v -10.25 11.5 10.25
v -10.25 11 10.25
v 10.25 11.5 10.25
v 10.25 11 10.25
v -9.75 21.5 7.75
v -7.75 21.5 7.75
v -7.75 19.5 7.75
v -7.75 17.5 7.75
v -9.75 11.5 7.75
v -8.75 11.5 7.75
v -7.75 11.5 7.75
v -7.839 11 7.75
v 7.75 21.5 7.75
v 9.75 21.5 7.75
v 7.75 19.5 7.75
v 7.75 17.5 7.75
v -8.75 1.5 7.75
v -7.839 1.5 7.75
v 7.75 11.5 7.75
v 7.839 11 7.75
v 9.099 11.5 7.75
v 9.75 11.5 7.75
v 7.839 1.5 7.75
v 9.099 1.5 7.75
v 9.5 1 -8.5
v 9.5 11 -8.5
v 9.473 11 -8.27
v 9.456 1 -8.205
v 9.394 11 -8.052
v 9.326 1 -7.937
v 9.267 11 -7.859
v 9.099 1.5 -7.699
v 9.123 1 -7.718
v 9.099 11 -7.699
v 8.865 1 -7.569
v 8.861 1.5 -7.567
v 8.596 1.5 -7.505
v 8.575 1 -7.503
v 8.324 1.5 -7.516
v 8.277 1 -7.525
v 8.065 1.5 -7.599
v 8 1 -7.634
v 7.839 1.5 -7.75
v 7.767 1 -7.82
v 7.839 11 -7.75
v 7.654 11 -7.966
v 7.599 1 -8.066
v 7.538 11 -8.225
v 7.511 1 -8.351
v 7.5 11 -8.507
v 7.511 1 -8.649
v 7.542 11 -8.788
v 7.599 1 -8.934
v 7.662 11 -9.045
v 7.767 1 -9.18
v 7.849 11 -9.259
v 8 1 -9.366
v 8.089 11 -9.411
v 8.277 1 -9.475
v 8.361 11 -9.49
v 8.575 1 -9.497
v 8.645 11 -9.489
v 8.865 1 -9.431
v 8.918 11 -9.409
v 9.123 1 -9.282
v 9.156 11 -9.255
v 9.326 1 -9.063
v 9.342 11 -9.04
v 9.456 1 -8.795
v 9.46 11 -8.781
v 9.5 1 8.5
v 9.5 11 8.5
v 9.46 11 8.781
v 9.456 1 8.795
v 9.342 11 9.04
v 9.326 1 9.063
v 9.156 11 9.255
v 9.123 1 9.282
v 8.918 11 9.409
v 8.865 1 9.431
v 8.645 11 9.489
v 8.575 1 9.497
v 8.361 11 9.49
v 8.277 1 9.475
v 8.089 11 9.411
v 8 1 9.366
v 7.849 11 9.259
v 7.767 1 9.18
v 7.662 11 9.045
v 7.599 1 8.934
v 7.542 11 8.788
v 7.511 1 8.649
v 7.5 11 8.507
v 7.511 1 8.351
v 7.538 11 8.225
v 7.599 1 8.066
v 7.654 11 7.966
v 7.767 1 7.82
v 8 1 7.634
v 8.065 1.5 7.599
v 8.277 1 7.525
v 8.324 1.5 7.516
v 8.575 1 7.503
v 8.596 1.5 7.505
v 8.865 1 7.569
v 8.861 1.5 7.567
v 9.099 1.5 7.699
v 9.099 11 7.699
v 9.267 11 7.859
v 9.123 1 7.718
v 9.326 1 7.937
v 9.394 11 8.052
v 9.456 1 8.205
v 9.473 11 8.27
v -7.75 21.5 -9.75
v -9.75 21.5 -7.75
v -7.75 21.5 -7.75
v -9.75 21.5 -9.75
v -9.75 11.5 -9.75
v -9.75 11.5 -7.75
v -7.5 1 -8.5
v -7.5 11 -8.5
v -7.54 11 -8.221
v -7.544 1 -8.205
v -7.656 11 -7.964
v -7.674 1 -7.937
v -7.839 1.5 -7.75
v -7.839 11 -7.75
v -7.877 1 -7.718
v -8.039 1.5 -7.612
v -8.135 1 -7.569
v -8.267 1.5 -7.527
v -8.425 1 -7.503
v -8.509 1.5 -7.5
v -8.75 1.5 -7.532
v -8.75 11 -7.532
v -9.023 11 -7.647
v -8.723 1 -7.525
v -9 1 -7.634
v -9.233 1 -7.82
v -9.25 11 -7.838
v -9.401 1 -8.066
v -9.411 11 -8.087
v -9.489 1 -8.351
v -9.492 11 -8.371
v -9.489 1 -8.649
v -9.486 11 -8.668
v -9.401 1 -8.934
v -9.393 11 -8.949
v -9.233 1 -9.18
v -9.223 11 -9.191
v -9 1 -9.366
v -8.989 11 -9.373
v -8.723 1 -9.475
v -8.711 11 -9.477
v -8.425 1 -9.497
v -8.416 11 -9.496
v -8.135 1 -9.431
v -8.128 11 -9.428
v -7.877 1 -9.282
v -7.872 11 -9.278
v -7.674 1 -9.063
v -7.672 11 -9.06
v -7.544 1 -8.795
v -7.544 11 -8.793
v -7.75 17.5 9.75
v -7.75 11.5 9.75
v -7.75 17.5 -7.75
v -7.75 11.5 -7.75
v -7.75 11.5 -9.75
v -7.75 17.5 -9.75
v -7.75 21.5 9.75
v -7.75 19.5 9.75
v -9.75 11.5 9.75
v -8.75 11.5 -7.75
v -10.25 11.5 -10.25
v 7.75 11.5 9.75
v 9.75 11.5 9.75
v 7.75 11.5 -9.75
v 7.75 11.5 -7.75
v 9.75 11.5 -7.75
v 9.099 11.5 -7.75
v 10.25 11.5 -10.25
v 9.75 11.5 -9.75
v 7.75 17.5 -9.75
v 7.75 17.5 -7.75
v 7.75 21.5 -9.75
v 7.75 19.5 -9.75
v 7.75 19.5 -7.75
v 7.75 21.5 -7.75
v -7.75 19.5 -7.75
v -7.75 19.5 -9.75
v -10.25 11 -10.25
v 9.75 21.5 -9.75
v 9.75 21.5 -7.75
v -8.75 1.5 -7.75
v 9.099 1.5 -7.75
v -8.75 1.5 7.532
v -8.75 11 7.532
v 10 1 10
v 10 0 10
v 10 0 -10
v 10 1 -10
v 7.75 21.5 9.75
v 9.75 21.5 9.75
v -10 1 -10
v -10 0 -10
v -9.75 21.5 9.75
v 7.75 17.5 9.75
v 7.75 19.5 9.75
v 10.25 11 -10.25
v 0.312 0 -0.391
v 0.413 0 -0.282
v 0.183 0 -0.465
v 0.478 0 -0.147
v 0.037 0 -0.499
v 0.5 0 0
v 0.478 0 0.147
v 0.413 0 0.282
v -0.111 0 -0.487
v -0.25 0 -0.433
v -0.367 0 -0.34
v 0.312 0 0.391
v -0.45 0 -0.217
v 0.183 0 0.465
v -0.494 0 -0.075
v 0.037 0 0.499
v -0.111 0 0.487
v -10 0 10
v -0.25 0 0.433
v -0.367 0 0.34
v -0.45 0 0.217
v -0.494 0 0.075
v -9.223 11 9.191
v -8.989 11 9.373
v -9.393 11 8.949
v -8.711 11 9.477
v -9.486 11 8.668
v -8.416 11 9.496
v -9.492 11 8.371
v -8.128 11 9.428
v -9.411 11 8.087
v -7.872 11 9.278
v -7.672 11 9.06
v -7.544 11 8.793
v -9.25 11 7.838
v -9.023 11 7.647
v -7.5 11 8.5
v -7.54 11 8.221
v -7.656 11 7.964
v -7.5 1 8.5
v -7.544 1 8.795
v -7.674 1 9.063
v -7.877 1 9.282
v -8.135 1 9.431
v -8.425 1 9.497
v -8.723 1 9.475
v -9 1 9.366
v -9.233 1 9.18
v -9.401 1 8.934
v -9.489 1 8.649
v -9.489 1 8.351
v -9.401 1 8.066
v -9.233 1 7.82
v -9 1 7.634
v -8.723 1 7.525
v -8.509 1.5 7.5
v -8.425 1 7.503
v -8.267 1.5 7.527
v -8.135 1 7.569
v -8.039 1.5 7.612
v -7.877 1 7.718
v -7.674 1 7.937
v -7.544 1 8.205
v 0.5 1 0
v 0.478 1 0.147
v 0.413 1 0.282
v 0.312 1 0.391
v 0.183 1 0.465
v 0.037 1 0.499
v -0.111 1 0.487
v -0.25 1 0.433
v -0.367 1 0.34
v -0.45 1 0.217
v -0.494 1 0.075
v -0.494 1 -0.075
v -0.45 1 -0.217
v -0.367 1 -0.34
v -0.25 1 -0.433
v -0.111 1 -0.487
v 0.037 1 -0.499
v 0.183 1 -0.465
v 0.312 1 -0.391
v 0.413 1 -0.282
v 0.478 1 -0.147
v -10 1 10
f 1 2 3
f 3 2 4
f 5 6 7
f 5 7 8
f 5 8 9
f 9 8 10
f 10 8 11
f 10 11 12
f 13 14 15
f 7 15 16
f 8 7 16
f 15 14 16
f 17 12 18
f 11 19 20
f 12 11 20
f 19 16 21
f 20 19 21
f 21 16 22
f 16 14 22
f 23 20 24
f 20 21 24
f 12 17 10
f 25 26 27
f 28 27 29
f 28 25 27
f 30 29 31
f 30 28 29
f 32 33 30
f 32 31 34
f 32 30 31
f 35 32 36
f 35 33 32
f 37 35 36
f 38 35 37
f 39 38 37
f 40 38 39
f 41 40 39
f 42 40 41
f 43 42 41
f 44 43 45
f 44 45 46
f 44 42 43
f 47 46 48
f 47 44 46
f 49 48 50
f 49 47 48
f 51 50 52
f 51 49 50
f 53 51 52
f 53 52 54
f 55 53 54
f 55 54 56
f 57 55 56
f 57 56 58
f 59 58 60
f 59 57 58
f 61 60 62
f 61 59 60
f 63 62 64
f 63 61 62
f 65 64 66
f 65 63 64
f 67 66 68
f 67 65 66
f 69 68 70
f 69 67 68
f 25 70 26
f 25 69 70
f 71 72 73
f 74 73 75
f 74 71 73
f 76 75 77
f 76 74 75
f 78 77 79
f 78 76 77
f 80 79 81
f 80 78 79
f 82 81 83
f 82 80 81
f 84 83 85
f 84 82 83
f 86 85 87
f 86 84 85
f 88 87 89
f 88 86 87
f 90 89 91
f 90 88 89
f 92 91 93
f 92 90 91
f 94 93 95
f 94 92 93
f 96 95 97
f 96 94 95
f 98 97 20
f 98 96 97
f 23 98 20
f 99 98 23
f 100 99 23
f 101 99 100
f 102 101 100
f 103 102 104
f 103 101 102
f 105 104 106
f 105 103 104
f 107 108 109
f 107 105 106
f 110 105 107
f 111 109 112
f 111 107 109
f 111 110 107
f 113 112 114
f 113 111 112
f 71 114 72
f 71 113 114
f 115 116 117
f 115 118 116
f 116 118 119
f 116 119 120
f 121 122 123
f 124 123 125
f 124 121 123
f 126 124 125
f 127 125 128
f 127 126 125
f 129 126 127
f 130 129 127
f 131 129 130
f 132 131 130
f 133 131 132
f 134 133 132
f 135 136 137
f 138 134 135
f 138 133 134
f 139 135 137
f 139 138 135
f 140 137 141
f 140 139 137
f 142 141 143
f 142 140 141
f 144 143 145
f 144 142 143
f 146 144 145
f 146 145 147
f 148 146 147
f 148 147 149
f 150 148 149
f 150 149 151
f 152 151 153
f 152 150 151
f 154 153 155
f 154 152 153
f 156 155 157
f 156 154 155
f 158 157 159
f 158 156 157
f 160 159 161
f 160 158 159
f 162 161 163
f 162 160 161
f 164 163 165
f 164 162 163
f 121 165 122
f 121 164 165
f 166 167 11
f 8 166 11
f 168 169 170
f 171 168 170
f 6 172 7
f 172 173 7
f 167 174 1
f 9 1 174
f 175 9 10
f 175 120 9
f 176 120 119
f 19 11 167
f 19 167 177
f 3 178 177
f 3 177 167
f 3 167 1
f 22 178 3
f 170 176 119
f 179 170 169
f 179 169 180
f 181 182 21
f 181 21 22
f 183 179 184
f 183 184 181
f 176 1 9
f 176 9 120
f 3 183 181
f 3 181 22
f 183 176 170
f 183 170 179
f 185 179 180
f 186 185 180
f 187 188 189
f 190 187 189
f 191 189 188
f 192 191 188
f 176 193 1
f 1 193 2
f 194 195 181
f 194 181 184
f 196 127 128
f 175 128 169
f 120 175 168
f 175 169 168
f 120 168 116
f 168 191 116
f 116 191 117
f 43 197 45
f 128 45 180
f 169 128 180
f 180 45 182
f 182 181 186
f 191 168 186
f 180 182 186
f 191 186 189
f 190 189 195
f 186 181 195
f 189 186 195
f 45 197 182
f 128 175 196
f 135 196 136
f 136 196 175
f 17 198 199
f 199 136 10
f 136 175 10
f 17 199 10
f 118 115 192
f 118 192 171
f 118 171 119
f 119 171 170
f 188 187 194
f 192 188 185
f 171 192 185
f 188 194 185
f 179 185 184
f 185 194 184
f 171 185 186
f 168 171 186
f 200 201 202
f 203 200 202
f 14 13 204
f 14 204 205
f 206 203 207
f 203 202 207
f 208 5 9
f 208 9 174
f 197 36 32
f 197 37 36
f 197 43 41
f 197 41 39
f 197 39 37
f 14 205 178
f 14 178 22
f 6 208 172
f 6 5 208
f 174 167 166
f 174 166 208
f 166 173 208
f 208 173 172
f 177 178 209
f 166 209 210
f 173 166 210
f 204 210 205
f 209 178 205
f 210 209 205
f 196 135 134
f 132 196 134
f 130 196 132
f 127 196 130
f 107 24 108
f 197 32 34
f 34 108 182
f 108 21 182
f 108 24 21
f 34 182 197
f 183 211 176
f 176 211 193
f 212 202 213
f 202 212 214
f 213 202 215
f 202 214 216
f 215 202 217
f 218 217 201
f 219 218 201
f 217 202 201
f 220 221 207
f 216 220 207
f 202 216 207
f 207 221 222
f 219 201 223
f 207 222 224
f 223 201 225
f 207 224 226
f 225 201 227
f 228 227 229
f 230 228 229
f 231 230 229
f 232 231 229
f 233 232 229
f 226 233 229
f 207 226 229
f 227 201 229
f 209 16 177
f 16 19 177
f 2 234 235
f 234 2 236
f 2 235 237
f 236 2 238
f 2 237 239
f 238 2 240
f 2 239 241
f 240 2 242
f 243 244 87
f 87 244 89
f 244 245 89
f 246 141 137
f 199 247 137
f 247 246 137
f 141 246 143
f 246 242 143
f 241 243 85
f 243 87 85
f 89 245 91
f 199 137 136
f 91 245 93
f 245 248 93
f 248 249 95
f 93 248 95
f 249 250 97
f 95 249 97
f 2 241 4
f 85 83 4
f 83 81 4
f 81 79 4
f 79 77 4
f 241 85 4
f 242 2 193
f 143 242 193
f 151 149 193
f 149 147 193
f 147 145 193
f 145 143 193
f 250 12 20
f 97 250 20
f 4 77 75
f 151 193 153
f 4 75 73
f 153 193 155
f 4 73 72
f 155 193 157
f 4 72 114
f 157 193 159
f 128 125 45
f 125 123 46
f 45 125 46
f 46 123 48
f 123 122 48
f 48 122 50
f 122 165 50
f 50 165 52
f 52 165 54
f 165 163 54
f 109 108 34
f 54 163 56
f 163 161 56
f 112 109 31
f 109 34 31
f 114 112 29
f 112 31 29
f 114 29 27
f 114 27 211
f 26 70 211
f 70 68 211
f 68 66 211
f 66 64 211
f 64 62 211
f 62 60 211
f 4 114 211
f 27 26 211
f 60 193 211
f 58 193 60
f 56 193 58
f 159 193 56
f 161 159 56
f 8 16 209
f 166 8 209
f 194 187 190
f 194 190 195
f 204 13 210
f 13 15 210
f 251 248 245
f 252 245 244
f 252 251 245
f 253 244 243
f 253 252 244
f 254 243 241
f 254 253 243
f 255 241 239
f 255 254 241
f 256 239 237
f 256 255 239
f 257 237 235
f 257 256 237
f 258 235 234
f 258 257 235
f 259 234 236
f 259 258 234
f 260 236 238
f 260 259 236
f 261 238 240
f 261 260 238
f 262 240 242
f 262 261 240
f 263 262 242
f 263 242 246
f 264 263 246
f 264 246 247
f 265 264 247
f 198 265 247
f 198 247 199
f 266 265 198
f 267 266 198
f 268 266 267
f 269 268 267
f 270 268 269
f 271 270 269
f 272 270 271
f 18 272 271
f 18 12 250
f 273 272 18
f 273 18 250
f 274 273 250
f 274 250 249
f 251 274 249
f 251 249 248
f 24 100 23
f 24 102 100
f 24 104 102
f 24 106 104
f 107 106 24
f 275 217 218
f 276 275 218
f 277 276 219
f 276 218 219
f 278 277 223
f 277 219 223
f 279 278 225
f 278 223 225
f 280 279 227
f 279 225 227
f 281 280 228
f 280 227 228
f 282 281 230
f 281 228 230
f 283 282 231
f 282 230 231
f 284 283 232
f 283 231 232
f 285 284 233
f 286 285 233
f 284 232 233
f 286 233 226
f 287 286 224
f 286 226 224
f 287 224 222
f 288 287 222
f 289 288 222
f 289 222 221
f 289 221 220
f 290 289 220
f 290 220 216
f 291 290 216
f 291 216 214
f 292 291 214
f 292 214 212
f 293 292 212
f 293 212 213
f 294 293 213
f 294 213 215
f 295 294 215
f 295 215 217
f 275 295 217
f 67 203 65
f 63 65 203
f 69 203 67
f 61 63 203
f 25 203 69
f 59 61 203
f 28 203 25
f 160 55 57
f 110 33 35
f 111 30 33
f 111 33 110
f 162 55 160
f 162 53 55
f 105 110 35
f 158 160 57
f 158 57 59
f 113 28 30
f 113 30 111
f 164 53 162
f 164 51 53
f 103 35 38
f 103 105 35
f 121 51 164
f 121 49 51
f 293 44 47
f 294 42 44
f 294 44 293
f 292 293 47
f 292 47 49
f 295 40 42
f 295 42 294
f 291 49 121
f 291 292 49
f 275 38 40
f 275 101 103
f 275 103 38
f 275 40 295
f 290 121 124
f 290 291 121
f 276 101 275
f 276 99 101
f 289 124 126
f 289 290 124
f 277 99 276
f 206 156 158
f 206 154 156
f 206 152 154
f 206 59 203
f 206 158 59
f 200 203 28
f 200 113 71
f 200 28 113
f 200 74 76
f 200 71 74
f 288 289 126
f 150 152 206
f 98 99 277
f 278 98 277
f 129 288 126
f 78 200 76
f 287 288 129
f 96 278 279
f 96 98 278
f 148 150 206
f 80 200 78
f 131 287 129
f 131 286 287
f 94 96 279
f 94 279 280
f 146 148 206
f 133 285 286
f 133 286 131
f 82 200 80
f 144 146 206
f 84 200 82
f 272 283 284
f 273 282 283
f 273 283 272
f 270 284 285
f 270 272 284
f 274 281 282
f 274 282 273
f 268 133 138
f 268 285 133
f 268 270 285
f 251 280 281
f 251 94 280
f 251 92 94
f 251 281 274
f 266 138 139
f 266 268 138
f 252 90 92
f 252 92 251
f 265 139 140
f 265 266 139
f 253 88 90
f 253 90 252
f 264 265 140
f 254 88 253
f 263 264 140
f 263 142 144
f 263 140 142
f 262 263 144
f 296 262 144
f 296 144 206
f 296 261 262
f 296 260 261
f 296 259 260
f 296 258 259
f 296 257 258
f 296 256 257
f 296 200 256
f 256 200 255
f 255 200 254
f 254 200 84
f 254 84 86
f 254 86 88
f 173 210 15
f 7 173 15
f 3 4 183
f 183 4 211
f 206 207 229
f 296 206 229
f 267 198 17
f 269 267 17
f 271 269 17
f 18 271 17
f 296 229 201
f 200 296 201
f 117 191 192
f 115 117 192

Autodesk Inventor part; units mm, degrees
ref_plane "YZ Plane" through (0, 0, 0) normal (1, 0, 0) x (0, 1, 0)
ref_plane "XZ Plane" through (0, 0, 0) normal (0, 1, 0) x (-1, 0, 0)
ref_plane "XY Plane" through (0, 0, 0) normal (0, 0, 1) x (1, 0, 0)
sketch "Sketch6" plane through (0, 0, 0) normal (0, 1, 0) x (-1, 0, 0)
  line L0 (-10, -10) -> (10, -10)
  line L1 (10, -10) -> (10, 10)
  line L2 (10, 10) -> (-10, 10)
  line L3 (-10, 10) -> (-10, -10)
  line L4 (-10, -10) -> (10, 10) construction
  line L5 (10, -10) -> (-10, 10) construction
  point P0 (0, 0)
  dimension "d28" = 20
  dimension "d29" = 20
extrude "Extrusion6" add sketch "Sketch6" along normal blind 1
sketch "Sketch7" plane through (0, 1, 0) normal (0, 1, 0) x (1, 0, 0)
  circle A0 centre (-8.5, -8.5) radius 1
  line L0 (-10, 10) -> (-10, -10) projected
  line L1 (-10, -10) -> (10, -10) projected
  point P0 (0, 0)
  dimension "d32" = 2
  dimension "d33" = 0.5
  dimension "d34" = 0.5
extrude "Extrusion7" add sketch "Sketch7" along normal blind 10
sketch "Sketch8" plane through (0, 1, 0) normal (0, 1, 0) x (1, 0, 0)
  circle A0 centre (-8.5, 8.5) radius 1
  line L0 (-10, 10) -> (-10, -10) projected
  line L1 (10, 10) -> (-10, 10) projected
  point P0 (0, 0)
  dimension "d37" = 2
  dimension "d38" = 0.5
  dimension "d39" = 0.5
extrude "Extrusion8" add sketch "Sketch8" along normal blind 10
sketch "Sketch9" plane through (0, 1, 0) normal (0, 1, 0) x (1, 0, 0)
  circle A0 centre (8.5, -8.5) radius 1
  line L0 (10, -10) -> (10, 10) projected
  line L1 (-10, -10) -> (10, -10) projected
  point P0 (0, 0)
  dimension "d42" = 2
  dimension "d43" = 0.5
  dimension "d44" = 0.5
extrude "Extrusion9" add sketch "Sketch9" along normal blind 10
sketch "Sketch10" plane through (0, 1, 0) normal (0, 1, 0) x (1, 0, 0)
  circle A0 centre (8.5, 8.5) radius 1
  line L0 (10, -10) -> (10, 10) projected
  line L1 (10, 10) -> (-10, 10) projected
  point P0 (0, 0)
  dimension "d47" = 2
  dimension "d48" = 0.5
  dimension "d49" = 0.5
extrude "Extrusion10" add sketch "Sketch10" along normal blind 10
sketch "Sketch11" plane through (-8.5, 11, 8.5) normal (0, 1, 0) x (1, 0, 0)
  line L0 (18.75, 18.75) -> (-1.75, 18.75)
  line L1 (-1.75, 18.75) -> (-1.75, -1.75)
  line L2 (-1.75, -1.75) -> (18.75, -1.75)
  line L3 (18.75, -1.75) -> (18.75, 18.75)
  line L4 (18.75, 18.75) -> (-1.75, -1.75) construction
  line L5 (-1.75, 18.75) -> (18.75, -1.75) construction
  point P0 (8.5, 8.5)
  dimension "d52" = 20.5
  dimension "d53" = 20.5
extrude "Extrusion11" add sketch "Sketch11" along normal blind 0.5
sketch "Sketch12" plane through (-8.5, 11.5, 8.5) normal (0, 1, 0) x (1, 0, 0)
  point P0 (8.5, 8.5)
sketch "Sketch13" plane through (-8.5, 11.5, 8.5) normal (0, 1, 0) x (1, 0, 0)
  line L0 (0.75, 0.75) -> (-1.25, 0.75)
  line L1 (-1.25, 0.75) -> (-1.25, -1.25)
  line L2 (-1.25, -1.25) -> (0.75, -1.25)
  line L3 (0.75, -1.25) -> (0.75, 0.75)
  line L4 (0.75, 0.75) -> (-1.25, -1.25) construction
  line L5 (-1.25, 0.75) -> (0.75, -1.25) construction
  line L6 (-1.75, -1.75) -> (18.75, -1.75) projected
  line L7 (-1.75, 18.75) -> (-1.75, -1.75) projected
  point P0 (8.5, 8.5)
  point P1 (-0.25, -0.25)
  dimension "d56" = 2
  dimension "d57" = 2
  dimension "d58" = 0.5
  dimension "d59" = 0.5
extrude "Extrusion12" add sketch "Sketch13" along normal blind 10
sketch "Sketch14" plane through (-8.5, 11.5, 8.5) normal (0, 1, 0) x (1, 0, 0)
  line L0 (-1.25, 16.25) -> (0.75, 16.25)
  line L1 (0.75, 16.25) -> (0.75, 18.25)
  line L2 (0.75, 18.25) -> (-1.25, 18.25)
  line L3 (-1.25, 18.25) -> (-1.25, 16.25)
  line L4 (-1.25, 16.25) -> (0.75, 18.25) construction
  line L5 (0.75, 16.25) -> (-1.25, 18.25) construction
  line L6 (-1.75, 18.75) -> (-1.75, -1.75) projected
  line L7 (18.75, 18.75) -> (-1.75, 18.75) projected
  point P0 (8.5, 8.5)
  point P1 (-0.25, 17.25)
  dimension "d62" = 2
  dimension "d63" = 2
  dimension "d64" = 0.5
  dimension "d65" = 0.5
extrude "Extrusion13" add sketch "Sketch14" along normal blind 10
sketch "Sketch15" plane through (-8.5, 11.5, 8.5) normal (0, 1, 0) x (1, 0, 0)
  line L0 (18.25, 0.75) -> (16.25, 0.75)
  line L1 (16.25, 0.75) -> (16.25, -1.25)
  line L2 (16.25, -1.25) -> (18.25, -1.25)
  line L3 (18.25, -1.25) -> (18.25, 0.75)
  line L4 (18.25, 0.75) -> (16.25, -1.25) construction
  line L5 (16.25, 0.75) -> (18.25, -1.25) construction
  line L6 (-1.75, -1.75) -> (18.75, -1.75) projected
  line L7 (18.75, -1.75) -> (18.75, 18.75) projected
  point P0 (8.5, 8.5)
  point P1 (17.25, -0.25)
  dimension "d68" = 2
  dimension "d69" = 2
  dimension "d70" = 0.5
  dimension "d71" = 0.5
extrude "Extrusion14" add sketch "Sketch15" along normal blind 10
sketch "Sketch16" plane through (-8.5, 11.5, 8.5) normal (0, 1, 0) x (1, 0, 0)
  line L0 (16.25, 16.25) -> (18.25, 16.25)
  line L1 (18.25, 16.25) -> (18.25, 18.25)
  line L2 (18.25, 18.25) -> (16.25, 18.25)
  line L3 (16.25, 18.25) -> (16.25, 16.25)
  line L4 (16.25, 16.25) -> (18.25, 18.25) construction
  line L5 (18.25, 16.25) -> (16.25, 18.25) construction
  line L6 (18.75, -1.75) -> (18.75, 18.75) projected
  line L7 (18.75, 18.75) -> (-1.75, 18.75) projected
  point P0 (8.5, 8.5)
  point P1 (17.25, 17.25)
  dimension "d74" = 2
  dimension "d75" = 2
  dimension "d76" = 0.5
  dimension "d77" = 0.5
extrude "Extrusion15" add sketch "Sketch16" along normal blind 10
sketch "Sketch17" plane through (-8.5, 11.5, 8.5) normal (0, 1, 0) x (1, 0, 0)
  line L0 (-1.25, 0.75) -> (0.75, 0.75) projected
  line L1 (-0.25, 0.75) -> (17.5992, 0.75)
  line L2 (17.5992, 0.75) -> (17.5992, 16.25)
  line L3 (17.5992, 16.25) -> (-0.25, 16.25)
  line L4 (-0.25, 16.25) -> (-0.25, 0.75)
  point P0 (8.5, 8.5)
extrude "Extrusion16" cut sketch "Sketch17" against normal blind 10
sketch "Sketch18" plane through (7.75, 11.5, -9.75) normal (-1, 0, 0) x (0, 0, 1)
  point P0 (9.75, -11.5)
sketch "Sketch19" plane through (7.75, 11.5, -9.75) normal (-1, 0, 0) x (0, 0, 1)
  point P0 (9.75, -11.5)
sketch "Sketch20" plane through (7.75, 11.5, -9.75) normal (-1, 0, 0) x (0, 0, 1)
  point P0 (9.75, -11.5)
sketch "Sketch21" plane through (7.75, 11.5, -9.75) normal (-1, 0, 0) x (0, 0, 1)
  line L0 (2, 8) -> (0, 8)
  line L1 (0, 8) -> (0, 6)
  line L2 (0, 6) -> (2, 6)
  line L3 (2, 6) -> (2, 8)
  line L4 (2, 0) -> (2, 10) projected
  line L5 (0, 10) -> (2, 10) projected
  point P0 (9.75, -11.5)
  dimension "d82" = 2
  dimension "d83" = 2
  dimension "d84" = 0
  dimension "d85" = 2
extrude "Extrusion17" add sketch "Sketch21" along normal blind 16
sketch "Sketch22" plane through (7.75, 11.5, 7.75) normal (-1, 0, 0) x (0, 0, 1)
  line L0 (2, 8) -> (0, 8)
  line L1 (0, 8) -> (0, 6)
  line L2 (0, 6) -> (2, 6)
  line L3 (2, 6) -> (2, 8)
  line L4 (2, 0) -> (2, 10) projected
  line L5 (0, 10) -> (2, 10) projected
  point P0 (-7.75, -11.5)
  dimension "d88" = 2
  dimension "d89" = 2
  dimension "d90" = 0
  dimension "d91" = 2
extrude "Extrusion18" add sketch "Sketch22" along normal blind 16
sketch "Sketch23" plane through (0, 0, 0) normal (0, -1, 0) x (1, 0, 0)
  circle A0 centre (0, 0) radius 0.5
  dimension "d94" = 1
extrude "Extrusion19" cut sketch "Sketch23" against normal blind 1
properties part number "tABLE" material "Brick, Common, Brown"
